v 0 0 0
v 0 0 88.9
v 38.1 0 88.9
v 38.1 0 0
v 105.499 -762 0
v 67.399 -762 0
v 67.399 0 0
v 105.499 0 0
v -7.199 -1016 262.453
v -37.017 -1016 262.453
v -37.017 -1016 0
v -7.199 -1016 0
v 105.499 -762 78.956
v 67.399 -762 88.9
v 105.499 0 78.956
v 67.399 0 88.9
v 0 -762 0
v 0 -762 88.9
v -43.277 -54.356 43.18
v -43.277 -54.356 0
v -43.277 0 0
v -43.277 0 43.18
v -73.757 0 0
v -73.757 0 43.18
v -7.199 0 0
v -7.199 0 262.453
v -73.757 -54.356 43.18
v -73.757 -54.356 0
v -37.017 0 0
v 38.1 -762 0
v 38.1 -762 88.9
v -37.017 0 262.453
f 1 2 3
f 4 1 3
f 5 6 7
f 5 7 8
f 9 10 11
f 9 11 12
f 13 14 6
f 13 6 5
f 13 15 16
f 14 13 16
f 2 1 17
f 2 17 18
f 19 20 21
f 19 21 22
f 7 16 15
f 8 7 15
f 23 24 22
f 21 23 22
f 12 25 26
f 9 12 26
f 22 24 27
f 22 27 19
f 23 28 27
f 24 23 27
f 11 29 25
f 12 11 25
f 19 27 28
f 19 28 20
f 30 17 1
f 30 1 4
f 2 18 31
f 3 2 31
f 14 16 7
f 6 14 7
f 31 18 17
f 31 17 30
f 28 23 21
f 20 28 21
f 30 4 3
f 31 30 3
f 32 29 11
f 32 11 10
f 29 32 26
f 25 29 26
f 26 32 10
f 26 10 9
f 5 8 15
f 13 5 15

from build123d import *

# Parameters (mm, degrees)
F0_W     = 38.1
F0_H     = 88.9
F1_DEPTH = 762
F2_W     = 30.48
F2_H     = 43.18
F3_DEPTH = 54.356
F5_DEPTH = 762
F6_W     = 29.817994
F6_H     = 262.453258
F7_DEPTH = 1016


with BuildPart() as f1:
    # F0 (on Front) → F1 (new body)
    with BuildSketch(Plane.XZ):
        with Locations((19.05, 44.45)):
            Rectangle(F0_W, F0_H)
    extrude(amount=F1_DEPTH)


with BuildPart() as f3:
    # F2 (on Front) → F3 (new body)
    with BuildSketch(Plane.XZ):
        with Locations((-58.517455, 21.59)):
            Rectangle(F2_W, F2_H)
    extrude(amount=F3_DEPTH)


with BuildPart() as f5:
    # F4 (on Front) → F5 (new body)
    with BuildSketch(Plane.XZ):
        Polygon((67.399275, 88.9), (67.399275, 0), (105.499275, 0), (105.499275, 78.955978), align=None)
    extrude(amount=F5_DEPTH)


with BuildPart() as f7:
    # F6 (on Front) → F7 (new body)
    with BuildSketch(Plane.XZ):
        with Locations((-22.108032, 131.226629)):
            Rectangle(F6_W, F6_H)
    extrude(amount=F7_DEPTH)


solid = Compound([f1.part, f3.part, f5.part, f7.part])
